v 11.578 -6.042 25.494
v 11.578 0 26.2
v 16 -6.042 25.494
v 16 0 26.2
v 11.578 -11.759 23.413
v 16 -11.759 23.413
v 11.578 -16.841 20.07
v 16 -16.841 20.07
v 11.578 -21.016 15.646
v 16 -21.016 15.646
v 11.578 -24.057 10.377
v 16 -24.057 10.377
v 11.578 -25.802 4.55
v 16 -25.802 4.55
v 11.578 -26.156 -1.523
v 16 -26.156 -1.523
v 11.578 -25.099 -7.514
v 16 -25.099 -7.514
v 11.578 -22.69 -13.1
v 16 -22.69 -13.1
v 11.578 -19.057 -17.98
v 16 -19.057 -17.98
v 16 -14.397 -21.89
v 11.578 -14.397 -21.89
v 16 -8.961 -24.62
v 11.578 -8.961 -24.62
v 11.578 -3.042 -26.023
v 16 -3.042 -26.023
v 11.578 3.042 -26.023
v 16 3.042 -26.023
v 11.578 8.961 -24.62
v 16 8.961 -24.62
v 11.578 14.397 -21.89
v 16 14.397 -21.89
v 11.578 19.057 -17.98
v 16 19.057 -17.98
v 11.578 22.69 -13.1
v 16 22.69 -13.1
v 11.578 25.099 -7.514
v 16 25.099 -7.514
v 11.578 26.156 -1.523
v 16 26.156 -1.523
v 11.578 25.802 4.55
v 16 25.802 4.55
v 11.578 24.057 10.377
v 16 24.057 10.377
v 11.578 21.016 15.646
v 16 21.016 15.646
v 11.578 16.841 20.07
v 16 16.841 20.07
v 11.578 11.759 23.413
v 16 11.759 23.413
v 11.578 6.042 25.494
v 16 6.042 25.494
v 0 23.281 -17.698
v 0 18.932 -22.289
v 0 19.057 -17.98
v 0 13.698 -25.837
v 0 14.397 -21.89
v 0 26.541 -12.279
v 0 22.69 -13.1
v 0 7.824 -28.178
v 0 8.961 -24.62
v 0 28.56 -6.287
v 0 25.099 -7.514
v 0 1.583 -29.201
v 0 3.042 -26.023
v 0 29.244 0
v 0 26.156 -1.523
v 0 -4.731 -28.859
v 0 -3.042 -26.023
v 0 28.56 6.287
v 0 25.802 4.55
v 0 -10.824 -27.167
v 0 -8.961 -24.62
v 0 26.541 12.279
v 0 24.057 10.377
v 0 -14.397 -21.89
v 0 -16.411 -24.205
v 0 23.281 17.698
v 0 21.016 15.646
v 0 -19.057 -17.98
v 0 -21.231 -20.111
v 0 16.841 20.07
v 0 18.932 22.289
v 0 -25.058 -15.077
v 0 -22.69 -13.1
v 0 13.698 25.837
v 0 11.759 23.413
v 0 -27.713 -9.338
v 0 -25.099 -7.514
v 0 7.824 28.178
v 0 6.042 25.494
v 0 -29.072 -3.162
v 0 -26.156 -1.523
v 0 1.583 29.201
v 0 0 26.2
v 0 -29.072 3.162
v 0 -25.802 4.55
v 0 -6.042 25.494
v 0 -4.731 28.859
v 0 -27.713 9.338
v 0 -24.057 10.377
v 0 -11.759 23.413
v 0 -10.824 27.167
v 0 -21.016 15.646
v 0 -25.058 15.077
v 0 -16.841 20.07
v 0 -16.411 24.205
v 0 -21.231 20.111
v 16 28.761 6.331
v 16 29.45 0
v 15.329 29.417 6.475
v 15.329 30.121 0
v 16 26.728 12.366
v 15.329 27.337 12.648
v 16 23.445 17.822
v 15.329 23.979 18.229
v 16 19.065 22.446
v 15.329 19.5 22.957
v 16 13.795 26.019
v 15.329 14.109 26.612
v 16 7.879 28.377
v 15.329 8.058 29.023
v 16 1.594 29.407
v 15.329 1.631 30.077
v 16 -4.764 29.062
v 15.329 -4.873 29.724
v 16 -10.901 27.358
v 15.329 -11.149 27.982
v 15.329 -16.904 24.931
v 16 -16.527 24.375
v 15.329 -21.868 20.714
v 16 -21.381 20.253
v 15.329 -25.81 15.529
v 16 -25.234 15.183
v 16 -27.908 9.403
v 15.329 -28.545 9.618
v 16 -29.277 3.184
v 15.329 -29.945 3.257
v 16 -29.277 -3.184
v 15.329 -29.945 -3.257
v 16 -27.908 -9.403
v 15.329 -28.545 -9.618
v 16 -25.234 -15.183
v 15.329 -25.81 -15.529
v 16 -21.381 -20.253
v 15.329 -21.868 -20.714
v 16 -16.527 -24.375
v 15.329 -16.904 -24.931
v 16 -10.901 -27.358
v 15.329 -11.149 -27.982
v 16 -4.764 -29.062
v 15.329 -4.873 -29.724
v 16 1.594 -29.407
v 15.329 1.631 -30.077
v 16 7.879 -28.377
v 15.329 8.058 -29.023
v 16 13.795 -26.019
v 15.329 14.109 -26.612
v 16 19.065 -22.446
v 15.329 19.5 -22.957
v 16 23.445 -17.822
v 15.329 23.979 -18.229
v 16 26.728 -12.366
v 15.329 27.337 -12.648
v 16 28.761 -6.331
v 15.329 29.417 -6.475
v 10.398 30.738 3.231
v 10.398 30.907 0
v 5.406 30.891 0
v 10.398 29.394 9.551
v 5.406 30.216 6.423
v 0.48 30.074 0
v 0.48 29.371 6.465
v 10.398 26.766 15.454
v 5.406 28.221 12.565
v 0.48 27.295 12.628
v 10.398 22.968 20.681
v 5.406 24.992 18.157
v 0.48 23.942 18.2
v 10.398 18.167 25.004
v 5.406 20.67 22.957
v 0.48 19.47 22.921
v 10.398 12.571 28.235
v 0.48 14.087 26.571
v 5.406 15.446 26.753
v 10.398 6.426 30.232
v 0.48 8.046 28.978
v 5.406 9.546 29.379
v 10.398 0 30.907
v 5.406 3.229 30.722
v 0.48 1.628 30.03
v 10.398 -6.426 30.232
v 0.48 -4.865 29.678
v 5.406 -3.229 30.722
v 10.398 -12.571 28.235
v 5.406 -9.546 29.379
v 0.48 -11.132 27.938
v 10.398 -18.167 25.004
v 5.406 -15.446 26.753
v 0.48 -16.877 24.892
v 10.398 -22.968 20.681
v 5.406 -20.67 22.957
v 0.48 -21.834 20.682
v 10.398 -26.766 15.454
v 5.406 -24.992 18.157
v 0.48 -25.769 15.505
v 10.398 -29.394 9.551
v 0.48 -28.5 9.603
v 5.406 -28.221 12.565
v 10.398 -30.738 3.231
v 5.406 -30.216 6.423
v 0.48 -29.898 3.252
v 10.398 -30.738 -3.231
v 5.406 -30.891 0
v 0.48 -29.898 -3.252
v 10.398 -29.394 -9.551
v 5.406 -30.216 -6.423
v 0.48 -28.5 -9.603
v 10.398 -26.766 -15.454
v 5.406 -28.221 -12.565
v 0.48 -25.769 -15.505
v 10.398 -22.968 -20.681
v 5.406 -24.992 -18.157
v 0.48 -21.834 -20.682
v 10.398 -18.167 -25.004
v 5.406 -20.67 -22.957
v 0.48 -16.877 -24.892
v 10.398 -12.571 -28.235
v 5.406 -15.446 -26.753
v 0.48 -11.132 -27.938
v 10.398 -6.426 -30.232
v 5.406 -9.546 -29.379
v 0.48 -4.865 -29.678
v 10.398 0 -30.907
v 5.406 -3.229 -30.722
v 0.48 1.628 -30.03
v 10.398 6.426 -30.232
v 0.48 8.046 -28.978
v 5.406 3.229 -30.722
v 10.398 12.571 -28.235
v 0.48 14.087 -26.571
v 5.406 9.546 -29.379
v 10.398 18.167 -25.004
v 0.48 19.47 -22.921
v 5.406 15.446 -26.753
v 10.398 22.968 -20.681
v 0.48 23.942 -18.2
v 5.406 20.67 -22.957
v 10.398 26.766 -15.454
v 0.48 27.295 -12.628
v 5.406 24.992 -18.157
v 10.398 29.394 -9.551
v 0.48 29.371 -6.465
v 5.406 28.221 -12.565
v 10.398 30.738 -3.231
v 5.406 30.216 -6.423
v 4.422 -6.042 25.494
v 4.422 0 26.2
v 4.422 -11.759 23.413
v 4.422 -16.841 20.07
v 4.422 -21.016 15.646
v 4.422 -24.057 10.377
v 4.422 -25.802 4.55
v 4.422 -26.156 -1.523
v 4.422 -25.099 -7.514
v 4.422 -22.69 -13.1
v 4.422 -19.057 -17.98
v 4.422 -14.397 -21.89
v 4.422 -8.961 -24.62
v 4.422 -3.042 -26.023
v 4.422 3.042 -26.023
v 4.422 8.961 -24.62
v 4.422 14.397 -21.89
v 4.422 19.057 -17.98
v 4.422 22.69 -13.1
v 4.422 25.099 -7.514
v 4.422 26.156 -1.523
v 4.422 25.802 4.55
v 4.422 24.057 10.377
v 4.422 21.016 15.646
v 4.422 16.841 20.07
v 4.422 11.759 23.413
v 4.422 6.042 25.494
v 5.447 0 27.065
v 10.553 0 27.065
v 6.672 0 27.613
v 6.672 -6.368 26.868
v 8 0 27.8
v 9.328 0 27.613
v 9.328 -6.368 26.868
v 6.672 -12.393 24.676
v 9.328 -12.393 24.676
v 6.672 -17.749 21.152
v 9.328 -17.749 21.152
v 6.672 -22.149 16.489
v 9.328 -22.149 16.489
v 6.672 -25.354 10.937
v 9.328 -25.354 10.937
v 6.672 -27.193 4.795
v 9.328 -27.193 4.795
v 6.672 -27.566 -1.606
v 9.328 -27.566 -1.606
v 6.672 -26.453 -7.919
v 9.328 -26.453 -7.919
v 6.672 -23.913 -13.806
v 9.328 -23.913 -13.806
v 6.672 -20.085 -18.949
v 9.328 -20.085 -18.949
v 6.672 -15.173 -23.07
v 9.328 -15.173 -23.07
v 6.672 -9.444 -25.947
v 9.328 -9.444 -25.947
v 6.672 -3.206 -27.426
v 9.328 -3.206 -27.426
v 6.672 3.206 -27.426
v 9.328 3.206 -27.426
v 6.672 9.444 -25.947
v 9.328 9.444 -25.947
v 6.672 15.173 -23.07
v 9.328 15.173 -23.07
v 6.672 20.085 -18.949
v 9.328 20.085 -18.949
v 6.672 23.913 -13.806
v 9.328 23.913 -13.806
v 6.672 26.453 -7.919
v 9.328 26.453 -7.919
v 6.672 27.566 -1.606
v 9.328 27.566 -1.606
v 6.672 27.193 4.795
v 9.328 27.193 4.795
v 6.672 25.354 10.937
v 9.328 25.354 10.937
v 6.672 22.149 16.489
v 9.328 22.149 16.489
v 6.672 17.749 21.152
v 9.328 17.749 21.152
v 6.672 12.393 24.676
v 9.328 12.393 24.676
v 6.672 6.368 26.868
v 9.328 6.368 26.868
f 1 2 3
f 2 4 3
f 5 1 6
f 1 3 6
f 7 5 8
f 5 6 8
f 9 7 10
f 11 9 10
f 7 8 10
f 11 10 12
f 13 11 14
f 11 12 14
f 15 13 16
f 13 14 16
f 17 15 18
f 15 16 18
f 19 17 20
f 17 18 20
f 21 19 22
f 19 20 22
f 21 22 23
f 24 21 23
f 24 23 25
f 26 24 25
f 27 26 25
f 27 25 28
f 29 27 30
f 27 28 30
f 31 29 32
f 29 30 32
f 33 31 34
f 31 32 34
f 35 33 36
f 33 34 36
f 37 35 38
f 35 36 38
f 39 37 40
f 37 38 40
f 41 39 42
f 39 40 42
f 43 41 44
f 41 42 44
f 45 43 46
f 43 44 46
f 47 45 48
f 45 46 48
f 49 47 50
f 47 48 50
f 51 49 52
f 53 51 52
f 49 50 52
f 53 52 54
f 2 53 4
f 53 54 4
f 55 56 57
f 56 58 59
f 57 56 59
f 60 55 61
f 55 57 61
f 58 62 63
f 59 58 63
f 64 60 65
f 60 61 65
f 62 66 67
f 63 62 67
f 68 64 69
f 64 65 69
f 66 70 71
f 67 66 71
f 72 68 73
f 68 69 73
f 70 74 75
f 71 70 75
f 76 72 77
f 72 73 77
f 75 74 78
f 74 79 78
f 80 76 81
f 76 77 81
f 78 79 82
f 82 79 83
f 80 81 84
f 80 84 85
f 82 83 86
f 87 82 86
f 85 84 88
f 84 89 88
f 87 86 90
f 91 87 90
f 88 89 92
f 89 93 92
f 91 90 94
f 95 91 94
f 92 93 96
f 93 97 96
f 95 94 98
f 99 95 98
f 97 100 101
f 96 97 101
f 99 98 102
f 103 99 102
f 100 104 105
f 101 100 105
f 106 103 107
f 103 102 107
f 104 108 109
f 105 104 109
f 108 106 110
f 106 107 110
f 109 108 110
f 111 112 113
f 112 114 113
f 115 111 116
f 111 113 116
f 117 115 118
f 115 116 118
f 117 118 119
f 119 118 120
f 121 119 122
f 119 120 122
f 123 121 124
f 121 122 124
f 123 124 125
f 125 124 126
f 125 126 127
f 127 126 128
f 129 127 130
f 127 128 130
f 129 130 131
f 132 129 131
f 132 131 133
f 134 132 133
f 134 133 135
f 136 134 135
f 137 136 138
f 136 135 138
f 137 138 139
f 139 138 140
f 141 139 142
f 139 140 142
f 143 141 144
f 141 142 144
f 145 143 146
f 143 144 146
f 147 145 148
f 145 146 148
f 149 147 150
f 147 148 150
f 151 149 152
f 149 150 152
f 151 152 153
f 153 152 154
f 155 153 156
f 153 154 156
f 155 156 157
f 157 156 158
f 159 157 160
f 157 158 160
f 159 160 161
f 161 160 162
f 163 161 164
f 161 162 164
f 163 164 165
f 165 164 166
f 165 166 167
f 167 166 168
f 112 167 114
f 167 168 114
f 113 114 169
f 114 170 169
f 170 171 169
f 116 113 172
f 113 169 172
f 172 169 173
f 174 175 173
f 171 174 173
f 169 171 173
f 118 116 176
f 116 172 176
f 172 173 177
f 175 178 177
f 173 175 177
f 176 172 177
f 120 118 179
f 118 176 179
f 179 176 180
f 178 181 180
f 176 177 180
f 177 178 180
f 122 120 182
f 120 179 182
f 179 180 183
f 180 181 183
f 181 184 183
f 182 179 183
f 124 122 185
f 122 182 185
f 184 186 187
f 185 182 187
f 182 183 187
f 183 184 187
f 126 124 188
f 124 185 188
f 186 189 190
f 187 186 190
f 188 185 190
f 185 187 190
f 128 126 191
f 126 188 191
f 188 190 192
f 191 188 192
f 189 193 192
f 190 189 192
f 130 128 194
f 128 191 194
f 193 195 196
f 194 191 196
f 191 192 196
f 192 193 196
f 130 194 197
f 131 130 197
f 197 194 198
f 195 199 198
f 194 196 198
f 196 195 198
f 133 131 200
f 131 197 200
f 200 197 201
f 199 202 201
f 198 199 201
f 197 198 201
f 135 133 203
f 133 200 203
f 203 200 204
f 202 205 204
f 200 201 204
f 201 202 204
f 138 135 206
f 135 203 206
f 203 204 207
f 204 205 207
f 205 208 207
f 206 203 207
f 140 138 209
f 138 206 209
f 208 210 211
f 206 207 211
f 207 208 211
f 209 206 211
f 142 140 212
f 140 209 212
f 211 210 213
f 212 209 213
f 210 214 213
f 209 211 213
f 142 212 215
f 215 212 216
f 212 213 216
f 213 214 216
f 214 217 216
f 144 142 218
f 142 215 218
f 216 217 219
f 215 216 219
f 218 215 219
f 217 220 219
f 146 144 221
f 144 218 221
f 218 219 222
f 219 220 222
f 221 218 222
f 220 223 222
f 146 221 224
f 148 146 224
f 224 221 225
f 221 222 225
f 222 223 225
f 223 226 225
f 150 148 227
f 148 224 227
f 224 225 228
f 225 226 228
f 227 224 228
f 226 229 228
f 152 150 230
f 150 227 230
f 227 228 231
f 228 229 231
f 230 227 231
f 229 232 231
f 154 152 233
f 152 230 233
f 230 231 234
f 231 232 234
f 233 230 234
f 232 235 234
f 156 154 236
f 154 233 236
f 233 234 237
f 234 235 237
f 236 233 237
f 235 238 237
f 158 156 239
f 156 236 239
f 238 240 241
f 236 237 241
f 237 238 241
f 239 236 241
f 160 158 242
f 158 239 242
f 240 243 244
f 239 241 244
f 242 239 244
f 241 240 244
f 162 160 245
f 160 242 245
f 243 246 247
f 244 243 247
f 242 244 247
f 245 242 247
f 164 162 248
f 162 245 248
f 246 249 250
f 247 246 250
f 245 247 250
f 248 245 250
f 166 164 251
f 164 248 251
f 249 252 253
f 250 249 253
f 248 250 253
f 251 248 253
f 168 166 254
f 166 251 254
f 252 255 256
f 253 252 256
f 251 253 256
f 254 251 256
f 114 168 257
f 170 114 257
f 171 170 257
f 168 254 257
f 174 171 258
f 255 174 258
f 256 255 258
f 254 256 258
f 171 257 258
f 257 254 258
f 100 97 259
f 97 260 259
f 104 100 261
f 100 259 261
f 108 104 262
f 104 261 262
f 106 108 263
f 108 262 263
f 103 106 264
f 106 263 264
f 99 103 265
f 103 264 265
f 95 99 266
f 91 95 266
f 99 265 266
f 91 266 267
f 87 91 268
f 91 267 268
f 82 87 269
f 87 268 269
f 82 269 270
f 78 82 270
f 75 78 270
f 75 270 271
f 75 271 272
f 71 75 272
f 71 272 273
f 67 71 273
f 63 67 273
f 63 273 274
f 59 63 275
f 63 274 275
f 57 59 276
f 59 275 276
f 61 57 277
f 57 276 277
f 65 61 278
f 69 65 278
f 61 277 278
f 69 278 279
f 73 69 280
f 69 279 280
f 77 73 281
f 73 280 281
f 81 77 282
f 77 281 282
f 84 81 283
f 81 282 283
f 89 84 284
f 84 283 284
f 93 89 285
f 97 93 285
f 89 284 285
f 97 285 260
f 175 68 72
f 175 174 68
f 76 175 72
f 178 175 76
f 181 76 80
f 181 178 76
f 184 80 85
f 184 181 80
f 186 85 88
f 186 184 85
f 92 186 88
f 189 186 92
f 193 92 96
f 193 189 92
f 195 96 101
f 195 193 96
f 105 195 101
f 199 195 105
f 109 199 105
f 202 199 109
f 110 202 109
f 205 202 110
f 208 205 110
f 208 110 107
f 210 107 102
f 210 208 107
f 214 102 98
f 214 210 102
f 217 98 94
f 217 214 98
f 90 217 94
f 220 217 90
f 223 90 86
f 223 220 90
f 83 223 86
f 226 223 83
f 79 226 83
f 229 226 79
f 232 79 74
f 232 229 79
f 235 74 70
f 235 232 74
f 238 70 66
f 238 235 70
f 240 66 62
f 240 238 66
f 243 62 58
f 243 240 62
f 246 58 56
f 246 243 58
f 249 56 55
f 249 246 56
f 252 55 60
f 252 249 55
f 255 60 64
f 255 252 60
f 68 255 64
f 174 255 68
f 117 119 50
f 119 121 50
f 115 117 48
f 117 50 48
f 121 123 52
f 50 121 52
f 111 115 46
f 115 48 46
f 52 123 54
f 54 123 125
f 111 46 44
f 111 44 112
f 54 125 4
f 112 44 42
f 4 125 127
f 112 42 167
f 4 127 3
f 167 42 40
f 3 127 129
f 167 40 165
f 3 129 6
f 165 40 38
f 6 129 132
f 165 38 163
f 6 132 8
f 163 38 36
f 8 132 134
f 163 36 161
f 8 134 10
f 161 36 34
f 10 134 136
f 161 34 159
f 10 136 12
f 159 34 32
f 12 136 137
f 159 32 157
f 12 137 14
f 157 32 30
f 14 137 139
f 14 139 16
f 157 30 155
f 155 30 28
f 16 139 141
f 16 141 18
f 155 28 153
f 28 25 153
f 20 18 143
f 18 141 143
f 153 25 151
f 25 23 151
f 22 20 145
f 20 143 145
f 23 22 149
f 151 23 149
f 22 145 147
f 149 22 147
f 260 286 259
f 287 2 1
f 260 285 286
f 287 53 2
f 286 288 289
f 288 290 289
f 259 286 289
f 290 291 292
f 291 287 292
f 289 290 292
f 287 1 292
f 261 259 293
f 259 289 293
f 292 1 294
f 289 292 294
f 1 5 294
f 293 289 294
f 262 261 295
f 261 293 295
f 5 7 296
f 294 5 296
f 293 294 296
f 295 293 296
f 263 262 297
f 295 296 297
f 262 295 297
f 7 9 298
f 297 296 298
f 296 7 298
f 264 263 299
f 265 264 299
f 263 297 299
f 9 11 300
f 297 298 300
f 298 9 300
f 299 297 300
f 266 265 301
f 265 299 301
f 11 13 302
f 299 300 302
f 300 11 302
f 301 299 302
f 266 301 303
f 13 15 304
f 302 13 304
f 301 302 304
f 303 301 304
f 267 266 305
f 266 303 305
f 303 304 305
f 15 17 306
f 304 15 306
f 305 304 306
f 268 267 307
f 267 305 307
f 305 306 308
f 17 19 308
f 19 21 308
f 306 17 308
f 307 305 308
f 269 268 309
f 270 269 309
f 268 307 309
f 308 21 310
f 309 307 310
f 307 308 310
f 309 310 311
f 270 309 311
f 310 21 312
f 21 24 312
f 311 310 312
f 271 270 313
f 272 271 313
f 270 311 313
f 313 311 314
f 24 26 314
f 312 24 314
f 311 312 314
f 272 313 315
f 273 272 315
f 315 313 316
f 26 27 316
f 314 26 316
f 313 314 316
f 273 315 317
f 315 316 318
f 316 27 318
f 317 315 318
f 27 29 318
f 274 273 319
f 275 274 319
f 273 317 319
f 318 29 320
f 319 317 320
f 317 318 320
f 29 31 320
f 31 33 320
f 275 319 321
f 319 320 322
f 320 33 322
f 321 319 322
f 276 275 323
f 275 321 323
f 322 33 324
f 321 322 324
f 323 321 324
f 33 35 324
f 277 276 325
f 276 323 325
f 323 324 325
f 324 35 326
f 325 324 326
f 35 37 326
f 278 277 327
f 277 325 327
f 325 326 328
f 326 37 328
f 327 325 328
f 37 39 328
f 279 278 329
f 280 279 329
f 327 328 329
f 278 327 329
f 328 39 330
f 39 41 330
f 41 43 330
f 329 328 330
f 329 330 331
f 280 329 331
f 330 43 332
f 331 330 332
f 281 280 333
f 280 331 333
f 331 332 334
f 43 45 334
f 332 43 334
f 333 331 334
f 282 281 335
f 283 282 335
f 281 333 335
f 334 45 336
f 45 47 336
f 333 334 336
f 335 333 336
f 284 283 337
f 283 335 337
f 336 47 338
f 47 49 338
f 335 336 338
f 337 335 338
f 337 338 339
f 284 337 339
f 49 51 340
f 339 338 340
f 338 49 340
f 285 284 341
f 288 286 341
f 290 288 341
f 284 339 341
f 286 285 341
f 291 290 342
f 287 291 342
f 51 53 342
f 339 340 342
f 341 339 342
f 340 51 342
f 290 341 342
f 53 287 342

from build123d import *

# Parameters (mm, degrees)
CHANFREIN1_SIZE   = 0.5
CHANFREIN1_SIZE_2 = 0.706151684


with BuildPart() as part:
    # Esquisse1 → Base-Révolution (revolve)
    with BuildSketch(Plane(origin=(0, 0, 0), x_dir=(1, 0, 0), z_dir=(0, 1, 0)), mode=Mode.PRIVATE) as base_r_volution_sk:
        with BuildLine():
            Line((0, 30), (0, 26.2))
            Line((0, 26.2), (4.422291236, 26.2))
            ThreePointArc((4.422291236, 26.2), (8, 27.8), (11.577708764, 26.2))
            Line((11.577708764, 26.2), (16, 26.2))
            Line((16, 26.2), (16, 30))
            ThreePointArc((16, 30), (15.707106781, 30.707106781), (15, 31))
            Line((15, 31), (1, 31))
            ThreePointArc((1, 31), (0.292893219, 30.707106781), (0, 30))
        make_face()
    revolve(base_r_volution_sk.sketch.rotate(Axis((0, 0, 0), (1, 0, 0)), 180), axis=Axis((0, 0, 0), (1, 0, 0)))

    # Esquisse2 → Enlèvement de matière-Révolution1 (revolve, cut)
    with BuildSketch(Plane.XY):
        with BuildLine():
            Line((0, 29.949958264), (0, 39.553831479))
            Line((0, 39.553831479), (16, 39.553831479))
            Line((16, 39.553831479), (16, 29.949958264))
            ThreePointArc((16, 29.949958264), (8, 31), (0, 29.949958264))
        make_face()
    revolve(axis=Axis((0, 0, 0), (1, 0, 0)), mode=Mode.SUBTRACT)

    # Chanfrein1
    # the kernel refuses this chamfer: 0.706151684, 0.5 mm, written as the material it takes off along each edge
    with BuildSketch(Plane(origin=(16, 0, 0), x_dir=(0, 1, 0), z_dir=(0, 0, -1))) as chanfrein1_piece_1:
        with BuildLine():
            Line((29.949958264 - CHANFREIN1_SIZE, 0), (30.121257319, -0.671299055))
            ThreePointArc((30.121257319, -0.671299055), (30.040483401, -0.34693806), (29.949958264, 0))
            Line((29.949958264, 0), (29.949958264 - CHANFREIN1_SIZE, 0))
        make_face()
    revolve(axis=Axis((16, 0, 0), (1, 0, 0)), mode=Mode.SUBTRACT)
    with BuildSketch(Plane(origin=(0, 0, 0), x_dir=(0, 1, 0), z_dir=(0, 0, -1))) as chanfrein1_piece_2:
        with BuildLine():
            Line((29.949958264 - CHANFREIN1_SIZE_2, 0), (30.074132004, 0.480253714))
            ThreePointArc((30.074132004, 0.480253714), (30.015483294, 0.249466944), (29.949958264, 0))
            Line((29.949958264, 0), (29.949958264 - CHANFREIN1_SIZE_2, 0))
        make_face()
    revolve(axis=Axis((0, 0, 0), (1, 0, 0)), mode=Mode.SUBTRACT)


solid = part.part
